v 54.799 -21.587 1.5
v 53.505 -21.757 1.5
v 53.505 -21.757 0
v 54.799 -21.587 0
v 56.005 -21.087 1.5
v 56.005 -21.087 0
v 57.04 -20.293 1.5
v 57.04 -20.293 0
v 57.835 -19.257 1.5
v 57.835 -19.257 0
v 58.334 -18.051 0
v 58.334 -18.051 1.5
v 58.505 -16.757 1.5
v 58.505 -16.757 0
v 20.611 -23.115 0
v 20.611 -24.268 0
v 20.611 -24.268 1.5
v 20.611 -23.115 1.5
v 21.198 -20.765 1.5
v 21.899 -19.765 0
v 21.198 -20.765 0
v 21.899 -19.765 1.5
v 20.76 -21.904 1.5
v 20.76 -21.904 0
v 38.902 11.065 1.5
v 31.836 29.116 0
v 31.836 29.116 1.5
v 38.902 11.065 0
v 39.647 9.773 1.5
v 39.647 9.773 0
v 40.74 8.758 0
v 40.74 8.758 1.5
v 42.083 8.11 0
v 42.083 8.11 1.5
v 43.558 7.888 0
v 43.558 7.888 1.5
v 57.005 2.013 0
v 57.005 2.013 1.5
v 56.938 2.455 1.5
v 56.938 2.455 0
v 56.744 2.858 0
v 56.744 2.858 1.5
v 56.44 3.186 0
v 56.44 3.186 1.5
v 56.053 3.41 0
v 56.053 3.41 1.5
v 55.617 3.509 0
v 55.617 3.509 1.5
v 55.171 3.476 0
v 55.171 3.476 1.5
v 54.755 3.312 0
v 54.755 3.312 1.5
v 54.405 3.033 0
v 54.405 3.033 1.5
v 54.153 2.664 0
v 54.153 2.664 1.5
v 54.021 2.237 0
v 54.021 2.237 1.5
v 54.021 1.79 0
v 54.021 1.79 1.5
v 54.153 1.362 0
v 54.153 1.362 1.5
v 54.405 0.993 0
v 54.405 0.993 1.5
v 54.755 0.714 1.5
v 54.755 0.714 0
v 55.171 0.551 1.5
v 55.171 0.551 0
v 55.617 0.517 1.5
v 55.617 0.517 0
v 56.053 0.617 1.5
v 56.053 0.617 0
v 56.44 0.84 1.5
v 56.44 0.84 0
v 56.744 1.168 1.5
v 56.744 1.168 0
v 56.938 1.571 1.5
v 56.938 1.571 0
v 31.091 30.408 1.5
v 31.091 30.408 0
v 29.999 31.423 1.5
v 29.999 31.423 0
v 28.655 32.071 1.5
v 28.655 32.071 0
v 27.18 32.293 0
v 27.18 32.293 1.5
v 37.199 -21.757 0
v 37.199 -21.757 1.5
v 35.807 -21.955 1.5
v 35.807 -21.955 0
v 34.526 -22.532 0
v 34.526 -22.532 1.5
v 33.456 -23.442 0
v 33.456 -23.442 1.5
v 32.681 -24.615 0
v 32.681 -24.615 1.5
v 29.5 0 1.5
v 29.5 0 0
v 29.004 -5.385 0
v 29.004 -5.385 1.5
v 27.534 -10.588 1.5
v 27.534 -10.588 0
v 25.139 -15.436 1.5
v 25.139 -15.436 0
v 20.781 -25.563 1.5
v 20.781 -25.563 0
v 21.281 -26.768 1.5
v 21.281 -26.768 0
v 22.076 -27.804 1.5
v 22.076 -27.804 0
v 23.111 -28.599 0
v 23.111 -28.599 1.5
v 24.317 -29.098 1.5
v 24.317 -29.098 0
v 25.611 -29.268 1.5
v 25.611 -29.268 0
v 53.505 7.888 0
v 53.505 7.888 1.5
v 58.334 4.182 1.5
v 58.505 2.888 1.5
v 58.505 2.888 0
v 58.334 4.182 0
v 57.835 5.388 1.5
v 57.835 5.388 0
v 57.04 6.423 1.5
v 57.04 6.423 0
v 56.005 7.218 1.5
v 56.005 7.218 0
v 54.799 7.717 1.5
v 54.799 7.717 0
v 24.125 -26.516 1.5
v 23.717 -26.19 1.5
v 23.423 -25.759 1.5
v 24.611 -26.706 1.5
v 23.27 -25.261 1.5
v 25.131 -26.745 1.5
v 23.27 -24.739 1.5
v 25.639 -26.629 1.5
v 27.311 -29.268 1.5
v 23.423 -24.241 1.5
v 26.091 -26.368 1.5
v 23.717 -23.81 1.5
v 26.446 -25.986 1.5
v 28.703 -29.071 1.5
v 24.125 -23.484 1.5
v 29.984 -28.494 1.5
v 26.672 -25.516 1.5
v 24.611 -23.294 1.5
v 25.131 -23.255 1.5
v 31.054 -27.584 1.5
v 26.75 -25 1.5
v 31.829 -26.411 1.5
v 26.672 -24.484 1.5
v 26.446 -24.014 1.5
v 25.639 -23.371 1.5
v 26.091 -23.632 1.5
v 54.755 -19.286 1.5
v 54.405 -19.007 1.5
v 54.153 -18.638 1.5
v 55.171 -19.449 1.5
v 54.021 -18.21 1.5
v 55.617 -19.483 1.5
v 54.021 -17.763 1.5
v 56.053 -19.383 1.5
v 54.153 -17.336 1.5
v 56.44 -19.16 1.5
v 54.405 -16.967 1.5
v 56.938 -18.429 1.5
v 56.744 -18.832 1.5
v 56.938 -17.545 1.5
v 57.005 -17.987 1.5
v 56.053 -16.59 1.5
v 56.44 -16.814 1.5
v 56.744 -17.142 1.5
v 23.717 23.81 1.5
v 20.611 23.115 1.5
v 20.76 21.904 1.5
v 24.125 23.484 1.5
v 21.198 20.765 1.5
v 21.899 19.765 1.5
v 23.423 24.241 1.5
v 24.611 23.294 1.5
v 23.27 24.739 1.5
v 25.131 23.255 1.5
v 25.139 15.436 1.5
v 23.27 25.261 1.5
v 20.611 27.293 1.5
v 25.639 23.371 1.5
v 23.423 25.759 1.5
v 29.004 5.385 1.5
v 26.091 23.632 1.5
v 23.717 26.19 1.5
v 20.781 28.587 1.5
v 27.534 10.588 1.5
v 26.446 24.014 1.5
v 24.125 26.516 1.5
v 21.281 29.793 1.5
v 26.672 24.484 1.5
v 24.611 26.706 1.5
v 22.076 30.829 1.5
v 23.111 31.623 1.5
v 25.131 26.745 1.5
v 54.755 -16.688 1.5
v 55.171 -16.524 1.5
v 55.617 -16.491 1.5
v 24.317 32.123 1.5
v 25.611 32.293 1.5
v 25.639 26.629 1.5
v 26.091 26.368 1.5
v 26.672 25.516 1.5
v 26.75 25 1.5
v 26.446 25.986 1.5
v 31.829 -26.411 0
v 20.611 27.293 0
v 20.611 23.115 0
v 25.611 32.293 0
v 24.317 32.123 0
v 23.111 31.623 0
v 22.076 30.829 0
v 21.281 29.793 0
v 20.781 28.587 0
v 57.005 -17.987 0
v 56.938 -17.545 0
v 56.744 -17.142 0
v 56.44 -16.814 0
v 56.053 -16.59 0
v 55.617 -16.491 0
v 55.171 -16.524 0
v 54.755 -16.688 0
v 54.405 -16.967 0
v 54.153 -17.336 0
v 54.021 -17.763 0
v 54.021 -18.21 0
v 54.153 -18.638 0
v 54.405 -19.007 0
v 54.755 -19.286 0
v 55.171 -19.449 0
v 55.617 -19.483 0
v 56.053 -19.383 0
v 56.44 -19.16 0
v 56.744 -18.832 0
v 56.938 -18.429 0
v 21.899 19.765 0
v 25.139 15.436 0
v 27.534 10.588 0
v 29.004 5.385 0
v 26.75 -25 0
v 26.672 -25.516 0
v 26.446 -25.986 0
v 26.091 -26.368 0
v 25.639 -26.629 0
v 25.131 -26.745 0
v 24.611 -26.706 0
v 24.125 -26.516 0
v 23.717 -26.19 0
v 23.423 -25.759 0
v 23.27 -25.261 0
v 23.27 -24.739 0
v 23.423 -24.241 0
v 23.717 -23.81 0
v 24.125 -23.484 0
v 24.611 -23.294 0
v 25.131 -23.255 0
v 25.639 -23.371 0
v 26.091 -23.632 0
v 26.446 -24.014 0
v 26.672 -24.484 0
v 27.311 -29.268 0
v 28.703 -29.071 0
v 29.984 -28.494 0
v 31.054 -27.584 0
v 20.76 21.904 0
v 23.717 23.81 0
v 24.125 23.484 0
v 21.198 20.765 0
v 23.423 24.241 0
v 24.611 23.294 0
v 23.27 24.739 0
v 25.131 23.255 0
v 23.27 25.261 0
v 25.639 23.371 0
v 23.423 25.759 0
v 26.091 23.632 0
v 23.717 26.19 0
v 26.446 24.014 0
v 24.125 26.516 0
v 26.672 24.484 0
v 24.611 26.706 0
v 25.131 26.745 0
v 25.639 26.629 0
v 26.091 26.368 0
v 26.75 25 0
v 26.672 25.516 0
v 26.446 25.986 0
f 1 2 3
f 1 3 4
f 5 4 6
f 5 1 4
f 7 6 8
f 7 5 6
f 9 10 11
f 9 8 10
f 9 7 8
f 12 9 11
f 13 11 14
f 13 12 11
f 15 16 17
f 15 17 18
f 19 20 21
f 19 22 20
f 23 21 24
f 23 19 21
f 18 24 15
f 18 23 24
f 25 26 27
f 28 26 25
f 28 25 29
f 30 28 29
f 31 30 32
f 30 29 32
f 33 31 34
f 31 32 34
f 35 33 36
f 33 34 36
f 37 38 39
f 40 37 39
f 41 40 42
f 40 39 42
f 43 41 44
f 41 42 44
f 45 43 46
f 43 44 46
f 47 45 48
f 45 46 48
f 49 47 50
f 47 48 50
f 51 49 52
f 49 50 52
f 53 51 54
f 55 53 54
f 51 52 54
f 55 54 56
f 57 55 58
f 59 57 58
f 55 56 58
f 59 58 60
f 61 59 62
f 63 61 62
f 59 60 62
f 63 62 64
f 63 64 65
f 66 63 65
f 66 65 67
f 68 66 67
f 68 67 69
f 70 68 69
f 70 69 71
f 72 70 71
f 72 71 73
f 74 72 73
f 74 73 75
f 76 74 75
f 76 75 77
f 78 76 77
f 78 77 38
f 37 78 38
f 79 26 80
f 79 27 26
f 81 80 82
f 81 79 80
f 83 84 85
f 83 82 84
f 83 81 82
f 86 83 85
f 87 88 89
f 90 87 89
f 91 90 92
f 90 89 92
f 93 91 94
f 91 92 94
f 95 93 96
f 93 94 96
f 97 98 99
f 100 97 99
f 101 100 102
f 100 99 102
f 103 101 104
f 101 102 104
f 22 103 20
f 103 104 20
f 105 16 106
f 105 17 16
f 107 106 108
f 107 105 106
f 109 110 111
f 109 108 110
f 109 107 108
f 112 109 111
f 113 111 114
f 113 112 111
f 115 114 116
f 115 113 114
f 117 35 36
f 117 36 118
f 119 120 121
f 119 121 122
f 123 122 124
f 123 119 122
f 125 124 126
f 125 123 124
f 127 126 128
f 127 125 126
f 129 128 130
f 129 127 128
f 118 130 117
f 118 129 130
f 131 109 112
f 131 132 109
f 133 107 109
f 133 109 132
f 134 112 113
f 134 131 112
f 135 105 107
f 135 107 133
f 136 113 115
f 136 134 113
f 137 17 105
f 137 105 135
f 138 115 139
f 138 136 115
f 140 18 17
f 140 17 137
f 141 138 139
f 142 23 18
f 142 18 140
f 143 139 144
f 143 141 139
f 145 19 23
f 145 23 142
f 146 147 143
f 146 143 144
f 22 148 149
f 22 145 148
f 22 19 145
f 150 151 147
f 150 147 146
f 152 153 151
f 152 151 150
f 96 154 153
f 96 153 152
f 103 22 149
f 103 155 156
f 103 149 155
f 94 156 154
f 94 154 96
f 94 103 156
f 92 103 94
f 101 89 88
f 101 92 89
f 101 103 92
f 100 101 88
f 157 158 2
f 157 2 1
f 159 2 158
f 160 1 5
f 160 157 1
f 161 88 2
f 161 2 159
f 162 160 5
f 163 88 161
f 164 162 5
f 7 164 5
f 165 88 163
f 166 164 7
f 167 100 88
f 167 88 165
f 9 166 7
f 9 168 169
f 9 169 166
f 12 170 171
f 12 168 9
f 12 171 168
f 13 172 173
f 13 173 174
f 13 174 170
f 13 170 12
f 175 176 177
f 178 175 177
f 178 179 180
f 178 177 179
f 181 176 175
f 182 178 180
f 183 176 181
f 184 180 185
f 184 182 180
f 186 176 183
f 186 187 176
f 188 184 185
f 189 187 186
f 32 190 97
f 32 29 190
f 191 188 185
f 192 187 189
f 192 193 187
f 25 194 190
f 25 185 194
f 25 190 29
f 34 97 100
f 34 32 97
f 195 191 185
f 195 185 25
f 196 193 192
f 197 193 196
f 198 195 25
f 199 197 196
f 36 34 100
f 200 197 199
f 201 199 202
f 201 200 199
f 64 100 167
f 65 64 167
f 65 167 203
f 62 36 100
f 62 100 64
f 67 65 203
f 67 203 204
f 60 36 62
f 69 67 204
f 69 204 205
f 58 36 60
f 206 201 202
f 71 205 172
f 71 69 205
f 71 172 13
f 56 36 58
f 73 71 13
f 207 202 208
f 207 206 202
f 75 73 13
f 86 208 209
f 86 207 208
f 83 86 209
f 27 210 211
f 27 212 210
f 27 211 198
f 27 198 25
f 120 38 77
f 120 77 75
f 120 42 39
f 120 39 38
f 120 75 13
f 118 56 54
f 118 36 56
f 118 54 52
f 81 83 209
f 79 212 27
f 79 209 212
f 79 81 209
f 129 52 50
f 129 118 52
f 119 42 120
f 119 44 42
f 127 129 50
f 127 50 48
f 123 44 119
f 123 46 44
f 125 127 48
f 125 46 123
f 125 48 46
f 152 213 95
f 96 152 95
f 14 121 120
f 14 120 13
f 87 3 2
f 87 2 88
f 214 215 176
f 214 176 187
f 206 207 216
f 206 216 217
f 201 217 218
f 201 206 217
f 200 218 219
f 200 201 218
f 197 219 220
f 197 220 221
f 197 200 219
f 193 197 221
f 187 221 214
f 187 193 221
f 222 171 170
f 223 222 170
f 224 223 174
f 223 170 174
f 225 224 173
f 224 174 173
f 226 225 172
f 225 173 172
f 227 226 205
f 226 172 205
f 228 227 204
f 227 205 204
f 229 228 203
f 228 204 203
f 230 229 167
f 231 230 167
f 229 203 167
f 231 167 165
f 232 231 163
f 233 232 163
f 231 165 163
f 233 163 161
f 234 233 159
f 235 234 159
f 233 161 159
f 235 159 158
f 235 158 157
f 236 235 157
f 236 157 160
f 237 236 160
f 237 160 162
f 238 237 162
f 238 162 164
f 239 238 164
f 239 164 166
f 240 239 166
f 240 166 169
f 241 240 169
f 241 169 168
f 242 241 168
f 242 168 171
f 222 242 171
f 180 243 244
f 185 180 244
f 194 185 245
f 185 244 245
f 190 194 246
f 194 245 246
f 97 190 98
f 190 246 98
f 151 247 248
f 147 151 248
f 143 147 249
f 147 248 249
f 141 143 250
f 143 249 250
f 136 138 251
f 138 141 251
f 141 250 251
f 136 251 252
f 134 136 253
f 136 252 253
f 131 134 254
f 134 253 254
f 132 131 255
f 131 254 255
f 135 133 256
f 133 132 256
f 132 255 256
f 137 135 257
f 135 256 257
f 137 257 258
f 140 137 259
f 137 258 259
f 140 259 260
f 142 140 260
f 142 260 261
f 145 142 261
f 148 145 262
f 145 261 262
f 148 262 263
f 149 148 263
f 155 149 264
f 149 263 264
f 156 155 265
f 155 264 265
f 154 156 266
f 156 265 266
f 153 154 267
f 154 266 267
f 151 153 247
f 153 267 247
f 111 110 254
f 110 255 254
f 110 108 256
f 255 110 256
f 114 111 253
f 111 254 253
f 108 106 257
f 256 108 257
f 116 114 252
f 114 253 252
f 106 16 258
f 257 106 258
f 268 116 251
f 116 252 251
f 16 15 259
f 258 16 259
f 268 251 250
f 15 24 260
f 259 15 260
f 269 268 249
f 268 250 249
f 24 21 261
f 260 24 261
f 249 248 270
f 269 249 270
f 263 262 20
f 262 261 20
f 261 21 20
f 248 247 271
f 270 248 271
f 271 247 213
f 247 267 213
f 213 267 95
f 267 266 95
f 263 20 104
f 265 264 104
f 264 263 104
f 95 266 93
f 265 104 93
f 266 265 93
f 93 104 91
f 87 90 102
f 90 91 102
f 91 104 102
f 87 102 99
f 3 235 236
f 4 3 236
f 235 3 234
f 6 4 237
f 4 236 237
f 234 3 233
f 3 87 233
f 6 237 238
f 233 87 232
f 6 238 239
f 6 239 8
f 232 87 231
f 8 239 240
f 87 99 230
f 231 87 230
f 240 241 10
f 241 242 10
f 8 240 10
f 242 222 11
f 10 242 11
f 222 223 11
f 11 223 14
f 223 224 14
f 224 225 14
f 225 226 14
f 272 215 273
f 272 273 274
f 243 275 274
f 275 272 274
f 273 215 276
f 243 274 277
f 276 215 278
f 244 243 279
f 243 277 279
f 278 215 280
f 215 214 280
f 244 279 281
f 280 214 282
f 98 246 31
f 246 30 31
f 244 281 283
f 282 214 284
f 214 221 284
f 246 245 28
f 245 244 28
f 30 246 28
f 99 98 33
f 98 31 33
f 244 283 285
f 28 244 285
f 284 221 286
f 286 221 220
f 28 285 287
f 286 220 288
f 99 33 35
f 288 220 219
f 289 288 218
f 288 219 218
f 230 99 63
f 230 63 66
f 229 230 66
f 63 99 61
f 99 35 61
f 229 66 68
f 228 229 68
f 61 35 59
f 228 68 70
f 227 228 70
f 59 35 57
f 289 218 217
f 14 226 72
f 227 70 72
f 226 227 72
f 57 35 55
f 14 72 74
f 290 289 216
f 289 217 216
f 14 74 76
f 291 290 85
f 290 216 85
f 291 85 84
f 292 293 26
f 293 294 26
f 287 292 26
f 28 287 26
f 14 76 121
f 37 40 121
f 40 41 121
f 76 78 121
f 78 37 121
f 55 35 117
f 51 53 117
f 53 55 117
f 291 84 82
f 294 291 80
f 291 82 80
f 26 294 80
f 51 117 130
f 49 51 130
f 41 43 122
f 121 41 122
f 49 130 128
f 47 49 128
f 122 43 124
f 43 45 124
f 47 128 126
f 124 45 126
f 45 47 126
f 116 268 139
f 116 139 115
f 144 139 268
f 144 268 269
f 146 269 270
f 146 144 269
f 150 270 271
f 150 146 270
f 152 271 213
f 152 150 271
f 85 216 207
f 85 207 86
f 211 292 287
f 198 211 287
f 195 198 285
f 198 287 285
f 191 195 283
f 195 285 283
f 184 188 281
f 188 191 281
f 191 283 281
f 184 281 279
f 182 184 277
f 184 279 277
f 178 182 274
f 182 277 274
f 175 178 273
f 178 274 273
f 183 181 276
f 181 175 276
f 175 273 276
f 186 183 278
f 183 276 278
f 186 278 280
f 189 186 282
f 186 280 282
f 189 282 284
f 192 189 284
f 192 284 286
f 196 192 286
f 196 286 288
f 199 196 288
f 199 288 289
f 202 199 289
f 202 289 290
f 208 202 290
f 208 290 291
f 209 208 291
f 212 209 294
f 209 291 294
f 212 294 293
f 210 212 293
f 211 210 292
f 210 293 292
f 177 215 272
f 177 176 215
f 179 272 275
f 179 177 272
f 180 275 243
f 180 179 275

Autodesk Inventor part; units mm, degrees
ref_plane "YZ Plane" through (0, 0, 0) normal (1, 0, 0) x (0, 1, 0)
ref_plane "XZ Plane" through (0, 0, 0) normal (0, 1, 0) x (-1, 0, 0)
ref_plane "XY Plane" through (0, 0, 0) normal (0, 0, 1) x (1, 0, 0)
sketch "Эскиз1" plane through (0, 0, 0) normal (0, 0, 1) x (1, 0, 0)
  circle A0 centre (25, -25) radius 1.75
  circle A1 centre (25, 25) radius 1.75
  line L0 (20.6111, 32.2931) -> (30.5924, 32.2931)
  line L1 (30.4739, -29.2685) -> (20.6111, -29.2685)
  line L2 (40.1458, 7.8878) -> (58.5047, 7.8878)
  line L3 (58.5047, 7.8878) -> (58.5047, -21.7573)
  line L4 (58.5047, -21.7573) -> (34.0362, -21.7573)
  arc A2 (29.5, 0) -> (20.6111, 21.1053) centre (0, 0) ccw
  arc A3 (20.6111, -21.1053) -> (29.5, 0) centre (0, 0) ccw
  line L5 (30.5924, 32.2931) -> (40.1458, 7.8878)
  line L6 (30.4739, -29.2685) -> (34.0362, -21.7573)
  line L7 (20.6111, -29.2685) -> (20.6111, -21.1053)
  line L8 (20.6111, 21.1053) -> (20.6111, 32.2931)
  line L9 (25, 25) -> (25, -25) construction
  line L10 (25, 0) -> (58.5047, 0) construction
  dimension "d10" = 25
  dimension "d11" = 25
extrude "Выдавливание1" add sketch "Эскиз1" along normal blind 1.5
fillet "Сопряжение1" radius 5 10 edges at (20.6111, -29.2685, 0.75) (20.6111, 32.2931, 0.75) (20.6111, -21.1053, 0.75) (20.6111, 21.1053, 0.75) (30.5924, 32.2931, 0.75) (40.1458, 7.8878, 0.75) (34.0362, -21.7573, 0.75) (58.5047, -21.7573, 0.75) (58.5047, 7.8878, 0.75) (30.4739, -29.2685, 0.75)
sketch "Эскиз2" plane through (0, 0, 1.5) normal (0, 0, 1) x (1, 0, 0)
  line L0 (55.5047, 2.0132) -> (55.5047, -17.9868)
  line L1 (55.5047, -17.9868) -> (55.5047, 2.0132)
  circle A0 centre (55.5047, 2.0132) radius 1.5
  circle A1 centre (55.5047, -17.9868) radius 1.5
  line L2 (58.5047, 2.8878) -> (58.5047, -16.7573) projected
  line L3 (58.5047, -16.7573) -> (58.5047, 2.8878) projected
  line L4 (58.5047, -7.9868) -> (55.5047, -7.9868)
  point P0 (0, 0)
  dimension "d4" = 3
  dimension "d5" = 3
  dimension "d6" = 3
  dimension "d7" = 20
extrude "Выдавливание2" cut sketch "Эскиз2" against normal blind 1.5
properties part number "крепление вентилятора1"
